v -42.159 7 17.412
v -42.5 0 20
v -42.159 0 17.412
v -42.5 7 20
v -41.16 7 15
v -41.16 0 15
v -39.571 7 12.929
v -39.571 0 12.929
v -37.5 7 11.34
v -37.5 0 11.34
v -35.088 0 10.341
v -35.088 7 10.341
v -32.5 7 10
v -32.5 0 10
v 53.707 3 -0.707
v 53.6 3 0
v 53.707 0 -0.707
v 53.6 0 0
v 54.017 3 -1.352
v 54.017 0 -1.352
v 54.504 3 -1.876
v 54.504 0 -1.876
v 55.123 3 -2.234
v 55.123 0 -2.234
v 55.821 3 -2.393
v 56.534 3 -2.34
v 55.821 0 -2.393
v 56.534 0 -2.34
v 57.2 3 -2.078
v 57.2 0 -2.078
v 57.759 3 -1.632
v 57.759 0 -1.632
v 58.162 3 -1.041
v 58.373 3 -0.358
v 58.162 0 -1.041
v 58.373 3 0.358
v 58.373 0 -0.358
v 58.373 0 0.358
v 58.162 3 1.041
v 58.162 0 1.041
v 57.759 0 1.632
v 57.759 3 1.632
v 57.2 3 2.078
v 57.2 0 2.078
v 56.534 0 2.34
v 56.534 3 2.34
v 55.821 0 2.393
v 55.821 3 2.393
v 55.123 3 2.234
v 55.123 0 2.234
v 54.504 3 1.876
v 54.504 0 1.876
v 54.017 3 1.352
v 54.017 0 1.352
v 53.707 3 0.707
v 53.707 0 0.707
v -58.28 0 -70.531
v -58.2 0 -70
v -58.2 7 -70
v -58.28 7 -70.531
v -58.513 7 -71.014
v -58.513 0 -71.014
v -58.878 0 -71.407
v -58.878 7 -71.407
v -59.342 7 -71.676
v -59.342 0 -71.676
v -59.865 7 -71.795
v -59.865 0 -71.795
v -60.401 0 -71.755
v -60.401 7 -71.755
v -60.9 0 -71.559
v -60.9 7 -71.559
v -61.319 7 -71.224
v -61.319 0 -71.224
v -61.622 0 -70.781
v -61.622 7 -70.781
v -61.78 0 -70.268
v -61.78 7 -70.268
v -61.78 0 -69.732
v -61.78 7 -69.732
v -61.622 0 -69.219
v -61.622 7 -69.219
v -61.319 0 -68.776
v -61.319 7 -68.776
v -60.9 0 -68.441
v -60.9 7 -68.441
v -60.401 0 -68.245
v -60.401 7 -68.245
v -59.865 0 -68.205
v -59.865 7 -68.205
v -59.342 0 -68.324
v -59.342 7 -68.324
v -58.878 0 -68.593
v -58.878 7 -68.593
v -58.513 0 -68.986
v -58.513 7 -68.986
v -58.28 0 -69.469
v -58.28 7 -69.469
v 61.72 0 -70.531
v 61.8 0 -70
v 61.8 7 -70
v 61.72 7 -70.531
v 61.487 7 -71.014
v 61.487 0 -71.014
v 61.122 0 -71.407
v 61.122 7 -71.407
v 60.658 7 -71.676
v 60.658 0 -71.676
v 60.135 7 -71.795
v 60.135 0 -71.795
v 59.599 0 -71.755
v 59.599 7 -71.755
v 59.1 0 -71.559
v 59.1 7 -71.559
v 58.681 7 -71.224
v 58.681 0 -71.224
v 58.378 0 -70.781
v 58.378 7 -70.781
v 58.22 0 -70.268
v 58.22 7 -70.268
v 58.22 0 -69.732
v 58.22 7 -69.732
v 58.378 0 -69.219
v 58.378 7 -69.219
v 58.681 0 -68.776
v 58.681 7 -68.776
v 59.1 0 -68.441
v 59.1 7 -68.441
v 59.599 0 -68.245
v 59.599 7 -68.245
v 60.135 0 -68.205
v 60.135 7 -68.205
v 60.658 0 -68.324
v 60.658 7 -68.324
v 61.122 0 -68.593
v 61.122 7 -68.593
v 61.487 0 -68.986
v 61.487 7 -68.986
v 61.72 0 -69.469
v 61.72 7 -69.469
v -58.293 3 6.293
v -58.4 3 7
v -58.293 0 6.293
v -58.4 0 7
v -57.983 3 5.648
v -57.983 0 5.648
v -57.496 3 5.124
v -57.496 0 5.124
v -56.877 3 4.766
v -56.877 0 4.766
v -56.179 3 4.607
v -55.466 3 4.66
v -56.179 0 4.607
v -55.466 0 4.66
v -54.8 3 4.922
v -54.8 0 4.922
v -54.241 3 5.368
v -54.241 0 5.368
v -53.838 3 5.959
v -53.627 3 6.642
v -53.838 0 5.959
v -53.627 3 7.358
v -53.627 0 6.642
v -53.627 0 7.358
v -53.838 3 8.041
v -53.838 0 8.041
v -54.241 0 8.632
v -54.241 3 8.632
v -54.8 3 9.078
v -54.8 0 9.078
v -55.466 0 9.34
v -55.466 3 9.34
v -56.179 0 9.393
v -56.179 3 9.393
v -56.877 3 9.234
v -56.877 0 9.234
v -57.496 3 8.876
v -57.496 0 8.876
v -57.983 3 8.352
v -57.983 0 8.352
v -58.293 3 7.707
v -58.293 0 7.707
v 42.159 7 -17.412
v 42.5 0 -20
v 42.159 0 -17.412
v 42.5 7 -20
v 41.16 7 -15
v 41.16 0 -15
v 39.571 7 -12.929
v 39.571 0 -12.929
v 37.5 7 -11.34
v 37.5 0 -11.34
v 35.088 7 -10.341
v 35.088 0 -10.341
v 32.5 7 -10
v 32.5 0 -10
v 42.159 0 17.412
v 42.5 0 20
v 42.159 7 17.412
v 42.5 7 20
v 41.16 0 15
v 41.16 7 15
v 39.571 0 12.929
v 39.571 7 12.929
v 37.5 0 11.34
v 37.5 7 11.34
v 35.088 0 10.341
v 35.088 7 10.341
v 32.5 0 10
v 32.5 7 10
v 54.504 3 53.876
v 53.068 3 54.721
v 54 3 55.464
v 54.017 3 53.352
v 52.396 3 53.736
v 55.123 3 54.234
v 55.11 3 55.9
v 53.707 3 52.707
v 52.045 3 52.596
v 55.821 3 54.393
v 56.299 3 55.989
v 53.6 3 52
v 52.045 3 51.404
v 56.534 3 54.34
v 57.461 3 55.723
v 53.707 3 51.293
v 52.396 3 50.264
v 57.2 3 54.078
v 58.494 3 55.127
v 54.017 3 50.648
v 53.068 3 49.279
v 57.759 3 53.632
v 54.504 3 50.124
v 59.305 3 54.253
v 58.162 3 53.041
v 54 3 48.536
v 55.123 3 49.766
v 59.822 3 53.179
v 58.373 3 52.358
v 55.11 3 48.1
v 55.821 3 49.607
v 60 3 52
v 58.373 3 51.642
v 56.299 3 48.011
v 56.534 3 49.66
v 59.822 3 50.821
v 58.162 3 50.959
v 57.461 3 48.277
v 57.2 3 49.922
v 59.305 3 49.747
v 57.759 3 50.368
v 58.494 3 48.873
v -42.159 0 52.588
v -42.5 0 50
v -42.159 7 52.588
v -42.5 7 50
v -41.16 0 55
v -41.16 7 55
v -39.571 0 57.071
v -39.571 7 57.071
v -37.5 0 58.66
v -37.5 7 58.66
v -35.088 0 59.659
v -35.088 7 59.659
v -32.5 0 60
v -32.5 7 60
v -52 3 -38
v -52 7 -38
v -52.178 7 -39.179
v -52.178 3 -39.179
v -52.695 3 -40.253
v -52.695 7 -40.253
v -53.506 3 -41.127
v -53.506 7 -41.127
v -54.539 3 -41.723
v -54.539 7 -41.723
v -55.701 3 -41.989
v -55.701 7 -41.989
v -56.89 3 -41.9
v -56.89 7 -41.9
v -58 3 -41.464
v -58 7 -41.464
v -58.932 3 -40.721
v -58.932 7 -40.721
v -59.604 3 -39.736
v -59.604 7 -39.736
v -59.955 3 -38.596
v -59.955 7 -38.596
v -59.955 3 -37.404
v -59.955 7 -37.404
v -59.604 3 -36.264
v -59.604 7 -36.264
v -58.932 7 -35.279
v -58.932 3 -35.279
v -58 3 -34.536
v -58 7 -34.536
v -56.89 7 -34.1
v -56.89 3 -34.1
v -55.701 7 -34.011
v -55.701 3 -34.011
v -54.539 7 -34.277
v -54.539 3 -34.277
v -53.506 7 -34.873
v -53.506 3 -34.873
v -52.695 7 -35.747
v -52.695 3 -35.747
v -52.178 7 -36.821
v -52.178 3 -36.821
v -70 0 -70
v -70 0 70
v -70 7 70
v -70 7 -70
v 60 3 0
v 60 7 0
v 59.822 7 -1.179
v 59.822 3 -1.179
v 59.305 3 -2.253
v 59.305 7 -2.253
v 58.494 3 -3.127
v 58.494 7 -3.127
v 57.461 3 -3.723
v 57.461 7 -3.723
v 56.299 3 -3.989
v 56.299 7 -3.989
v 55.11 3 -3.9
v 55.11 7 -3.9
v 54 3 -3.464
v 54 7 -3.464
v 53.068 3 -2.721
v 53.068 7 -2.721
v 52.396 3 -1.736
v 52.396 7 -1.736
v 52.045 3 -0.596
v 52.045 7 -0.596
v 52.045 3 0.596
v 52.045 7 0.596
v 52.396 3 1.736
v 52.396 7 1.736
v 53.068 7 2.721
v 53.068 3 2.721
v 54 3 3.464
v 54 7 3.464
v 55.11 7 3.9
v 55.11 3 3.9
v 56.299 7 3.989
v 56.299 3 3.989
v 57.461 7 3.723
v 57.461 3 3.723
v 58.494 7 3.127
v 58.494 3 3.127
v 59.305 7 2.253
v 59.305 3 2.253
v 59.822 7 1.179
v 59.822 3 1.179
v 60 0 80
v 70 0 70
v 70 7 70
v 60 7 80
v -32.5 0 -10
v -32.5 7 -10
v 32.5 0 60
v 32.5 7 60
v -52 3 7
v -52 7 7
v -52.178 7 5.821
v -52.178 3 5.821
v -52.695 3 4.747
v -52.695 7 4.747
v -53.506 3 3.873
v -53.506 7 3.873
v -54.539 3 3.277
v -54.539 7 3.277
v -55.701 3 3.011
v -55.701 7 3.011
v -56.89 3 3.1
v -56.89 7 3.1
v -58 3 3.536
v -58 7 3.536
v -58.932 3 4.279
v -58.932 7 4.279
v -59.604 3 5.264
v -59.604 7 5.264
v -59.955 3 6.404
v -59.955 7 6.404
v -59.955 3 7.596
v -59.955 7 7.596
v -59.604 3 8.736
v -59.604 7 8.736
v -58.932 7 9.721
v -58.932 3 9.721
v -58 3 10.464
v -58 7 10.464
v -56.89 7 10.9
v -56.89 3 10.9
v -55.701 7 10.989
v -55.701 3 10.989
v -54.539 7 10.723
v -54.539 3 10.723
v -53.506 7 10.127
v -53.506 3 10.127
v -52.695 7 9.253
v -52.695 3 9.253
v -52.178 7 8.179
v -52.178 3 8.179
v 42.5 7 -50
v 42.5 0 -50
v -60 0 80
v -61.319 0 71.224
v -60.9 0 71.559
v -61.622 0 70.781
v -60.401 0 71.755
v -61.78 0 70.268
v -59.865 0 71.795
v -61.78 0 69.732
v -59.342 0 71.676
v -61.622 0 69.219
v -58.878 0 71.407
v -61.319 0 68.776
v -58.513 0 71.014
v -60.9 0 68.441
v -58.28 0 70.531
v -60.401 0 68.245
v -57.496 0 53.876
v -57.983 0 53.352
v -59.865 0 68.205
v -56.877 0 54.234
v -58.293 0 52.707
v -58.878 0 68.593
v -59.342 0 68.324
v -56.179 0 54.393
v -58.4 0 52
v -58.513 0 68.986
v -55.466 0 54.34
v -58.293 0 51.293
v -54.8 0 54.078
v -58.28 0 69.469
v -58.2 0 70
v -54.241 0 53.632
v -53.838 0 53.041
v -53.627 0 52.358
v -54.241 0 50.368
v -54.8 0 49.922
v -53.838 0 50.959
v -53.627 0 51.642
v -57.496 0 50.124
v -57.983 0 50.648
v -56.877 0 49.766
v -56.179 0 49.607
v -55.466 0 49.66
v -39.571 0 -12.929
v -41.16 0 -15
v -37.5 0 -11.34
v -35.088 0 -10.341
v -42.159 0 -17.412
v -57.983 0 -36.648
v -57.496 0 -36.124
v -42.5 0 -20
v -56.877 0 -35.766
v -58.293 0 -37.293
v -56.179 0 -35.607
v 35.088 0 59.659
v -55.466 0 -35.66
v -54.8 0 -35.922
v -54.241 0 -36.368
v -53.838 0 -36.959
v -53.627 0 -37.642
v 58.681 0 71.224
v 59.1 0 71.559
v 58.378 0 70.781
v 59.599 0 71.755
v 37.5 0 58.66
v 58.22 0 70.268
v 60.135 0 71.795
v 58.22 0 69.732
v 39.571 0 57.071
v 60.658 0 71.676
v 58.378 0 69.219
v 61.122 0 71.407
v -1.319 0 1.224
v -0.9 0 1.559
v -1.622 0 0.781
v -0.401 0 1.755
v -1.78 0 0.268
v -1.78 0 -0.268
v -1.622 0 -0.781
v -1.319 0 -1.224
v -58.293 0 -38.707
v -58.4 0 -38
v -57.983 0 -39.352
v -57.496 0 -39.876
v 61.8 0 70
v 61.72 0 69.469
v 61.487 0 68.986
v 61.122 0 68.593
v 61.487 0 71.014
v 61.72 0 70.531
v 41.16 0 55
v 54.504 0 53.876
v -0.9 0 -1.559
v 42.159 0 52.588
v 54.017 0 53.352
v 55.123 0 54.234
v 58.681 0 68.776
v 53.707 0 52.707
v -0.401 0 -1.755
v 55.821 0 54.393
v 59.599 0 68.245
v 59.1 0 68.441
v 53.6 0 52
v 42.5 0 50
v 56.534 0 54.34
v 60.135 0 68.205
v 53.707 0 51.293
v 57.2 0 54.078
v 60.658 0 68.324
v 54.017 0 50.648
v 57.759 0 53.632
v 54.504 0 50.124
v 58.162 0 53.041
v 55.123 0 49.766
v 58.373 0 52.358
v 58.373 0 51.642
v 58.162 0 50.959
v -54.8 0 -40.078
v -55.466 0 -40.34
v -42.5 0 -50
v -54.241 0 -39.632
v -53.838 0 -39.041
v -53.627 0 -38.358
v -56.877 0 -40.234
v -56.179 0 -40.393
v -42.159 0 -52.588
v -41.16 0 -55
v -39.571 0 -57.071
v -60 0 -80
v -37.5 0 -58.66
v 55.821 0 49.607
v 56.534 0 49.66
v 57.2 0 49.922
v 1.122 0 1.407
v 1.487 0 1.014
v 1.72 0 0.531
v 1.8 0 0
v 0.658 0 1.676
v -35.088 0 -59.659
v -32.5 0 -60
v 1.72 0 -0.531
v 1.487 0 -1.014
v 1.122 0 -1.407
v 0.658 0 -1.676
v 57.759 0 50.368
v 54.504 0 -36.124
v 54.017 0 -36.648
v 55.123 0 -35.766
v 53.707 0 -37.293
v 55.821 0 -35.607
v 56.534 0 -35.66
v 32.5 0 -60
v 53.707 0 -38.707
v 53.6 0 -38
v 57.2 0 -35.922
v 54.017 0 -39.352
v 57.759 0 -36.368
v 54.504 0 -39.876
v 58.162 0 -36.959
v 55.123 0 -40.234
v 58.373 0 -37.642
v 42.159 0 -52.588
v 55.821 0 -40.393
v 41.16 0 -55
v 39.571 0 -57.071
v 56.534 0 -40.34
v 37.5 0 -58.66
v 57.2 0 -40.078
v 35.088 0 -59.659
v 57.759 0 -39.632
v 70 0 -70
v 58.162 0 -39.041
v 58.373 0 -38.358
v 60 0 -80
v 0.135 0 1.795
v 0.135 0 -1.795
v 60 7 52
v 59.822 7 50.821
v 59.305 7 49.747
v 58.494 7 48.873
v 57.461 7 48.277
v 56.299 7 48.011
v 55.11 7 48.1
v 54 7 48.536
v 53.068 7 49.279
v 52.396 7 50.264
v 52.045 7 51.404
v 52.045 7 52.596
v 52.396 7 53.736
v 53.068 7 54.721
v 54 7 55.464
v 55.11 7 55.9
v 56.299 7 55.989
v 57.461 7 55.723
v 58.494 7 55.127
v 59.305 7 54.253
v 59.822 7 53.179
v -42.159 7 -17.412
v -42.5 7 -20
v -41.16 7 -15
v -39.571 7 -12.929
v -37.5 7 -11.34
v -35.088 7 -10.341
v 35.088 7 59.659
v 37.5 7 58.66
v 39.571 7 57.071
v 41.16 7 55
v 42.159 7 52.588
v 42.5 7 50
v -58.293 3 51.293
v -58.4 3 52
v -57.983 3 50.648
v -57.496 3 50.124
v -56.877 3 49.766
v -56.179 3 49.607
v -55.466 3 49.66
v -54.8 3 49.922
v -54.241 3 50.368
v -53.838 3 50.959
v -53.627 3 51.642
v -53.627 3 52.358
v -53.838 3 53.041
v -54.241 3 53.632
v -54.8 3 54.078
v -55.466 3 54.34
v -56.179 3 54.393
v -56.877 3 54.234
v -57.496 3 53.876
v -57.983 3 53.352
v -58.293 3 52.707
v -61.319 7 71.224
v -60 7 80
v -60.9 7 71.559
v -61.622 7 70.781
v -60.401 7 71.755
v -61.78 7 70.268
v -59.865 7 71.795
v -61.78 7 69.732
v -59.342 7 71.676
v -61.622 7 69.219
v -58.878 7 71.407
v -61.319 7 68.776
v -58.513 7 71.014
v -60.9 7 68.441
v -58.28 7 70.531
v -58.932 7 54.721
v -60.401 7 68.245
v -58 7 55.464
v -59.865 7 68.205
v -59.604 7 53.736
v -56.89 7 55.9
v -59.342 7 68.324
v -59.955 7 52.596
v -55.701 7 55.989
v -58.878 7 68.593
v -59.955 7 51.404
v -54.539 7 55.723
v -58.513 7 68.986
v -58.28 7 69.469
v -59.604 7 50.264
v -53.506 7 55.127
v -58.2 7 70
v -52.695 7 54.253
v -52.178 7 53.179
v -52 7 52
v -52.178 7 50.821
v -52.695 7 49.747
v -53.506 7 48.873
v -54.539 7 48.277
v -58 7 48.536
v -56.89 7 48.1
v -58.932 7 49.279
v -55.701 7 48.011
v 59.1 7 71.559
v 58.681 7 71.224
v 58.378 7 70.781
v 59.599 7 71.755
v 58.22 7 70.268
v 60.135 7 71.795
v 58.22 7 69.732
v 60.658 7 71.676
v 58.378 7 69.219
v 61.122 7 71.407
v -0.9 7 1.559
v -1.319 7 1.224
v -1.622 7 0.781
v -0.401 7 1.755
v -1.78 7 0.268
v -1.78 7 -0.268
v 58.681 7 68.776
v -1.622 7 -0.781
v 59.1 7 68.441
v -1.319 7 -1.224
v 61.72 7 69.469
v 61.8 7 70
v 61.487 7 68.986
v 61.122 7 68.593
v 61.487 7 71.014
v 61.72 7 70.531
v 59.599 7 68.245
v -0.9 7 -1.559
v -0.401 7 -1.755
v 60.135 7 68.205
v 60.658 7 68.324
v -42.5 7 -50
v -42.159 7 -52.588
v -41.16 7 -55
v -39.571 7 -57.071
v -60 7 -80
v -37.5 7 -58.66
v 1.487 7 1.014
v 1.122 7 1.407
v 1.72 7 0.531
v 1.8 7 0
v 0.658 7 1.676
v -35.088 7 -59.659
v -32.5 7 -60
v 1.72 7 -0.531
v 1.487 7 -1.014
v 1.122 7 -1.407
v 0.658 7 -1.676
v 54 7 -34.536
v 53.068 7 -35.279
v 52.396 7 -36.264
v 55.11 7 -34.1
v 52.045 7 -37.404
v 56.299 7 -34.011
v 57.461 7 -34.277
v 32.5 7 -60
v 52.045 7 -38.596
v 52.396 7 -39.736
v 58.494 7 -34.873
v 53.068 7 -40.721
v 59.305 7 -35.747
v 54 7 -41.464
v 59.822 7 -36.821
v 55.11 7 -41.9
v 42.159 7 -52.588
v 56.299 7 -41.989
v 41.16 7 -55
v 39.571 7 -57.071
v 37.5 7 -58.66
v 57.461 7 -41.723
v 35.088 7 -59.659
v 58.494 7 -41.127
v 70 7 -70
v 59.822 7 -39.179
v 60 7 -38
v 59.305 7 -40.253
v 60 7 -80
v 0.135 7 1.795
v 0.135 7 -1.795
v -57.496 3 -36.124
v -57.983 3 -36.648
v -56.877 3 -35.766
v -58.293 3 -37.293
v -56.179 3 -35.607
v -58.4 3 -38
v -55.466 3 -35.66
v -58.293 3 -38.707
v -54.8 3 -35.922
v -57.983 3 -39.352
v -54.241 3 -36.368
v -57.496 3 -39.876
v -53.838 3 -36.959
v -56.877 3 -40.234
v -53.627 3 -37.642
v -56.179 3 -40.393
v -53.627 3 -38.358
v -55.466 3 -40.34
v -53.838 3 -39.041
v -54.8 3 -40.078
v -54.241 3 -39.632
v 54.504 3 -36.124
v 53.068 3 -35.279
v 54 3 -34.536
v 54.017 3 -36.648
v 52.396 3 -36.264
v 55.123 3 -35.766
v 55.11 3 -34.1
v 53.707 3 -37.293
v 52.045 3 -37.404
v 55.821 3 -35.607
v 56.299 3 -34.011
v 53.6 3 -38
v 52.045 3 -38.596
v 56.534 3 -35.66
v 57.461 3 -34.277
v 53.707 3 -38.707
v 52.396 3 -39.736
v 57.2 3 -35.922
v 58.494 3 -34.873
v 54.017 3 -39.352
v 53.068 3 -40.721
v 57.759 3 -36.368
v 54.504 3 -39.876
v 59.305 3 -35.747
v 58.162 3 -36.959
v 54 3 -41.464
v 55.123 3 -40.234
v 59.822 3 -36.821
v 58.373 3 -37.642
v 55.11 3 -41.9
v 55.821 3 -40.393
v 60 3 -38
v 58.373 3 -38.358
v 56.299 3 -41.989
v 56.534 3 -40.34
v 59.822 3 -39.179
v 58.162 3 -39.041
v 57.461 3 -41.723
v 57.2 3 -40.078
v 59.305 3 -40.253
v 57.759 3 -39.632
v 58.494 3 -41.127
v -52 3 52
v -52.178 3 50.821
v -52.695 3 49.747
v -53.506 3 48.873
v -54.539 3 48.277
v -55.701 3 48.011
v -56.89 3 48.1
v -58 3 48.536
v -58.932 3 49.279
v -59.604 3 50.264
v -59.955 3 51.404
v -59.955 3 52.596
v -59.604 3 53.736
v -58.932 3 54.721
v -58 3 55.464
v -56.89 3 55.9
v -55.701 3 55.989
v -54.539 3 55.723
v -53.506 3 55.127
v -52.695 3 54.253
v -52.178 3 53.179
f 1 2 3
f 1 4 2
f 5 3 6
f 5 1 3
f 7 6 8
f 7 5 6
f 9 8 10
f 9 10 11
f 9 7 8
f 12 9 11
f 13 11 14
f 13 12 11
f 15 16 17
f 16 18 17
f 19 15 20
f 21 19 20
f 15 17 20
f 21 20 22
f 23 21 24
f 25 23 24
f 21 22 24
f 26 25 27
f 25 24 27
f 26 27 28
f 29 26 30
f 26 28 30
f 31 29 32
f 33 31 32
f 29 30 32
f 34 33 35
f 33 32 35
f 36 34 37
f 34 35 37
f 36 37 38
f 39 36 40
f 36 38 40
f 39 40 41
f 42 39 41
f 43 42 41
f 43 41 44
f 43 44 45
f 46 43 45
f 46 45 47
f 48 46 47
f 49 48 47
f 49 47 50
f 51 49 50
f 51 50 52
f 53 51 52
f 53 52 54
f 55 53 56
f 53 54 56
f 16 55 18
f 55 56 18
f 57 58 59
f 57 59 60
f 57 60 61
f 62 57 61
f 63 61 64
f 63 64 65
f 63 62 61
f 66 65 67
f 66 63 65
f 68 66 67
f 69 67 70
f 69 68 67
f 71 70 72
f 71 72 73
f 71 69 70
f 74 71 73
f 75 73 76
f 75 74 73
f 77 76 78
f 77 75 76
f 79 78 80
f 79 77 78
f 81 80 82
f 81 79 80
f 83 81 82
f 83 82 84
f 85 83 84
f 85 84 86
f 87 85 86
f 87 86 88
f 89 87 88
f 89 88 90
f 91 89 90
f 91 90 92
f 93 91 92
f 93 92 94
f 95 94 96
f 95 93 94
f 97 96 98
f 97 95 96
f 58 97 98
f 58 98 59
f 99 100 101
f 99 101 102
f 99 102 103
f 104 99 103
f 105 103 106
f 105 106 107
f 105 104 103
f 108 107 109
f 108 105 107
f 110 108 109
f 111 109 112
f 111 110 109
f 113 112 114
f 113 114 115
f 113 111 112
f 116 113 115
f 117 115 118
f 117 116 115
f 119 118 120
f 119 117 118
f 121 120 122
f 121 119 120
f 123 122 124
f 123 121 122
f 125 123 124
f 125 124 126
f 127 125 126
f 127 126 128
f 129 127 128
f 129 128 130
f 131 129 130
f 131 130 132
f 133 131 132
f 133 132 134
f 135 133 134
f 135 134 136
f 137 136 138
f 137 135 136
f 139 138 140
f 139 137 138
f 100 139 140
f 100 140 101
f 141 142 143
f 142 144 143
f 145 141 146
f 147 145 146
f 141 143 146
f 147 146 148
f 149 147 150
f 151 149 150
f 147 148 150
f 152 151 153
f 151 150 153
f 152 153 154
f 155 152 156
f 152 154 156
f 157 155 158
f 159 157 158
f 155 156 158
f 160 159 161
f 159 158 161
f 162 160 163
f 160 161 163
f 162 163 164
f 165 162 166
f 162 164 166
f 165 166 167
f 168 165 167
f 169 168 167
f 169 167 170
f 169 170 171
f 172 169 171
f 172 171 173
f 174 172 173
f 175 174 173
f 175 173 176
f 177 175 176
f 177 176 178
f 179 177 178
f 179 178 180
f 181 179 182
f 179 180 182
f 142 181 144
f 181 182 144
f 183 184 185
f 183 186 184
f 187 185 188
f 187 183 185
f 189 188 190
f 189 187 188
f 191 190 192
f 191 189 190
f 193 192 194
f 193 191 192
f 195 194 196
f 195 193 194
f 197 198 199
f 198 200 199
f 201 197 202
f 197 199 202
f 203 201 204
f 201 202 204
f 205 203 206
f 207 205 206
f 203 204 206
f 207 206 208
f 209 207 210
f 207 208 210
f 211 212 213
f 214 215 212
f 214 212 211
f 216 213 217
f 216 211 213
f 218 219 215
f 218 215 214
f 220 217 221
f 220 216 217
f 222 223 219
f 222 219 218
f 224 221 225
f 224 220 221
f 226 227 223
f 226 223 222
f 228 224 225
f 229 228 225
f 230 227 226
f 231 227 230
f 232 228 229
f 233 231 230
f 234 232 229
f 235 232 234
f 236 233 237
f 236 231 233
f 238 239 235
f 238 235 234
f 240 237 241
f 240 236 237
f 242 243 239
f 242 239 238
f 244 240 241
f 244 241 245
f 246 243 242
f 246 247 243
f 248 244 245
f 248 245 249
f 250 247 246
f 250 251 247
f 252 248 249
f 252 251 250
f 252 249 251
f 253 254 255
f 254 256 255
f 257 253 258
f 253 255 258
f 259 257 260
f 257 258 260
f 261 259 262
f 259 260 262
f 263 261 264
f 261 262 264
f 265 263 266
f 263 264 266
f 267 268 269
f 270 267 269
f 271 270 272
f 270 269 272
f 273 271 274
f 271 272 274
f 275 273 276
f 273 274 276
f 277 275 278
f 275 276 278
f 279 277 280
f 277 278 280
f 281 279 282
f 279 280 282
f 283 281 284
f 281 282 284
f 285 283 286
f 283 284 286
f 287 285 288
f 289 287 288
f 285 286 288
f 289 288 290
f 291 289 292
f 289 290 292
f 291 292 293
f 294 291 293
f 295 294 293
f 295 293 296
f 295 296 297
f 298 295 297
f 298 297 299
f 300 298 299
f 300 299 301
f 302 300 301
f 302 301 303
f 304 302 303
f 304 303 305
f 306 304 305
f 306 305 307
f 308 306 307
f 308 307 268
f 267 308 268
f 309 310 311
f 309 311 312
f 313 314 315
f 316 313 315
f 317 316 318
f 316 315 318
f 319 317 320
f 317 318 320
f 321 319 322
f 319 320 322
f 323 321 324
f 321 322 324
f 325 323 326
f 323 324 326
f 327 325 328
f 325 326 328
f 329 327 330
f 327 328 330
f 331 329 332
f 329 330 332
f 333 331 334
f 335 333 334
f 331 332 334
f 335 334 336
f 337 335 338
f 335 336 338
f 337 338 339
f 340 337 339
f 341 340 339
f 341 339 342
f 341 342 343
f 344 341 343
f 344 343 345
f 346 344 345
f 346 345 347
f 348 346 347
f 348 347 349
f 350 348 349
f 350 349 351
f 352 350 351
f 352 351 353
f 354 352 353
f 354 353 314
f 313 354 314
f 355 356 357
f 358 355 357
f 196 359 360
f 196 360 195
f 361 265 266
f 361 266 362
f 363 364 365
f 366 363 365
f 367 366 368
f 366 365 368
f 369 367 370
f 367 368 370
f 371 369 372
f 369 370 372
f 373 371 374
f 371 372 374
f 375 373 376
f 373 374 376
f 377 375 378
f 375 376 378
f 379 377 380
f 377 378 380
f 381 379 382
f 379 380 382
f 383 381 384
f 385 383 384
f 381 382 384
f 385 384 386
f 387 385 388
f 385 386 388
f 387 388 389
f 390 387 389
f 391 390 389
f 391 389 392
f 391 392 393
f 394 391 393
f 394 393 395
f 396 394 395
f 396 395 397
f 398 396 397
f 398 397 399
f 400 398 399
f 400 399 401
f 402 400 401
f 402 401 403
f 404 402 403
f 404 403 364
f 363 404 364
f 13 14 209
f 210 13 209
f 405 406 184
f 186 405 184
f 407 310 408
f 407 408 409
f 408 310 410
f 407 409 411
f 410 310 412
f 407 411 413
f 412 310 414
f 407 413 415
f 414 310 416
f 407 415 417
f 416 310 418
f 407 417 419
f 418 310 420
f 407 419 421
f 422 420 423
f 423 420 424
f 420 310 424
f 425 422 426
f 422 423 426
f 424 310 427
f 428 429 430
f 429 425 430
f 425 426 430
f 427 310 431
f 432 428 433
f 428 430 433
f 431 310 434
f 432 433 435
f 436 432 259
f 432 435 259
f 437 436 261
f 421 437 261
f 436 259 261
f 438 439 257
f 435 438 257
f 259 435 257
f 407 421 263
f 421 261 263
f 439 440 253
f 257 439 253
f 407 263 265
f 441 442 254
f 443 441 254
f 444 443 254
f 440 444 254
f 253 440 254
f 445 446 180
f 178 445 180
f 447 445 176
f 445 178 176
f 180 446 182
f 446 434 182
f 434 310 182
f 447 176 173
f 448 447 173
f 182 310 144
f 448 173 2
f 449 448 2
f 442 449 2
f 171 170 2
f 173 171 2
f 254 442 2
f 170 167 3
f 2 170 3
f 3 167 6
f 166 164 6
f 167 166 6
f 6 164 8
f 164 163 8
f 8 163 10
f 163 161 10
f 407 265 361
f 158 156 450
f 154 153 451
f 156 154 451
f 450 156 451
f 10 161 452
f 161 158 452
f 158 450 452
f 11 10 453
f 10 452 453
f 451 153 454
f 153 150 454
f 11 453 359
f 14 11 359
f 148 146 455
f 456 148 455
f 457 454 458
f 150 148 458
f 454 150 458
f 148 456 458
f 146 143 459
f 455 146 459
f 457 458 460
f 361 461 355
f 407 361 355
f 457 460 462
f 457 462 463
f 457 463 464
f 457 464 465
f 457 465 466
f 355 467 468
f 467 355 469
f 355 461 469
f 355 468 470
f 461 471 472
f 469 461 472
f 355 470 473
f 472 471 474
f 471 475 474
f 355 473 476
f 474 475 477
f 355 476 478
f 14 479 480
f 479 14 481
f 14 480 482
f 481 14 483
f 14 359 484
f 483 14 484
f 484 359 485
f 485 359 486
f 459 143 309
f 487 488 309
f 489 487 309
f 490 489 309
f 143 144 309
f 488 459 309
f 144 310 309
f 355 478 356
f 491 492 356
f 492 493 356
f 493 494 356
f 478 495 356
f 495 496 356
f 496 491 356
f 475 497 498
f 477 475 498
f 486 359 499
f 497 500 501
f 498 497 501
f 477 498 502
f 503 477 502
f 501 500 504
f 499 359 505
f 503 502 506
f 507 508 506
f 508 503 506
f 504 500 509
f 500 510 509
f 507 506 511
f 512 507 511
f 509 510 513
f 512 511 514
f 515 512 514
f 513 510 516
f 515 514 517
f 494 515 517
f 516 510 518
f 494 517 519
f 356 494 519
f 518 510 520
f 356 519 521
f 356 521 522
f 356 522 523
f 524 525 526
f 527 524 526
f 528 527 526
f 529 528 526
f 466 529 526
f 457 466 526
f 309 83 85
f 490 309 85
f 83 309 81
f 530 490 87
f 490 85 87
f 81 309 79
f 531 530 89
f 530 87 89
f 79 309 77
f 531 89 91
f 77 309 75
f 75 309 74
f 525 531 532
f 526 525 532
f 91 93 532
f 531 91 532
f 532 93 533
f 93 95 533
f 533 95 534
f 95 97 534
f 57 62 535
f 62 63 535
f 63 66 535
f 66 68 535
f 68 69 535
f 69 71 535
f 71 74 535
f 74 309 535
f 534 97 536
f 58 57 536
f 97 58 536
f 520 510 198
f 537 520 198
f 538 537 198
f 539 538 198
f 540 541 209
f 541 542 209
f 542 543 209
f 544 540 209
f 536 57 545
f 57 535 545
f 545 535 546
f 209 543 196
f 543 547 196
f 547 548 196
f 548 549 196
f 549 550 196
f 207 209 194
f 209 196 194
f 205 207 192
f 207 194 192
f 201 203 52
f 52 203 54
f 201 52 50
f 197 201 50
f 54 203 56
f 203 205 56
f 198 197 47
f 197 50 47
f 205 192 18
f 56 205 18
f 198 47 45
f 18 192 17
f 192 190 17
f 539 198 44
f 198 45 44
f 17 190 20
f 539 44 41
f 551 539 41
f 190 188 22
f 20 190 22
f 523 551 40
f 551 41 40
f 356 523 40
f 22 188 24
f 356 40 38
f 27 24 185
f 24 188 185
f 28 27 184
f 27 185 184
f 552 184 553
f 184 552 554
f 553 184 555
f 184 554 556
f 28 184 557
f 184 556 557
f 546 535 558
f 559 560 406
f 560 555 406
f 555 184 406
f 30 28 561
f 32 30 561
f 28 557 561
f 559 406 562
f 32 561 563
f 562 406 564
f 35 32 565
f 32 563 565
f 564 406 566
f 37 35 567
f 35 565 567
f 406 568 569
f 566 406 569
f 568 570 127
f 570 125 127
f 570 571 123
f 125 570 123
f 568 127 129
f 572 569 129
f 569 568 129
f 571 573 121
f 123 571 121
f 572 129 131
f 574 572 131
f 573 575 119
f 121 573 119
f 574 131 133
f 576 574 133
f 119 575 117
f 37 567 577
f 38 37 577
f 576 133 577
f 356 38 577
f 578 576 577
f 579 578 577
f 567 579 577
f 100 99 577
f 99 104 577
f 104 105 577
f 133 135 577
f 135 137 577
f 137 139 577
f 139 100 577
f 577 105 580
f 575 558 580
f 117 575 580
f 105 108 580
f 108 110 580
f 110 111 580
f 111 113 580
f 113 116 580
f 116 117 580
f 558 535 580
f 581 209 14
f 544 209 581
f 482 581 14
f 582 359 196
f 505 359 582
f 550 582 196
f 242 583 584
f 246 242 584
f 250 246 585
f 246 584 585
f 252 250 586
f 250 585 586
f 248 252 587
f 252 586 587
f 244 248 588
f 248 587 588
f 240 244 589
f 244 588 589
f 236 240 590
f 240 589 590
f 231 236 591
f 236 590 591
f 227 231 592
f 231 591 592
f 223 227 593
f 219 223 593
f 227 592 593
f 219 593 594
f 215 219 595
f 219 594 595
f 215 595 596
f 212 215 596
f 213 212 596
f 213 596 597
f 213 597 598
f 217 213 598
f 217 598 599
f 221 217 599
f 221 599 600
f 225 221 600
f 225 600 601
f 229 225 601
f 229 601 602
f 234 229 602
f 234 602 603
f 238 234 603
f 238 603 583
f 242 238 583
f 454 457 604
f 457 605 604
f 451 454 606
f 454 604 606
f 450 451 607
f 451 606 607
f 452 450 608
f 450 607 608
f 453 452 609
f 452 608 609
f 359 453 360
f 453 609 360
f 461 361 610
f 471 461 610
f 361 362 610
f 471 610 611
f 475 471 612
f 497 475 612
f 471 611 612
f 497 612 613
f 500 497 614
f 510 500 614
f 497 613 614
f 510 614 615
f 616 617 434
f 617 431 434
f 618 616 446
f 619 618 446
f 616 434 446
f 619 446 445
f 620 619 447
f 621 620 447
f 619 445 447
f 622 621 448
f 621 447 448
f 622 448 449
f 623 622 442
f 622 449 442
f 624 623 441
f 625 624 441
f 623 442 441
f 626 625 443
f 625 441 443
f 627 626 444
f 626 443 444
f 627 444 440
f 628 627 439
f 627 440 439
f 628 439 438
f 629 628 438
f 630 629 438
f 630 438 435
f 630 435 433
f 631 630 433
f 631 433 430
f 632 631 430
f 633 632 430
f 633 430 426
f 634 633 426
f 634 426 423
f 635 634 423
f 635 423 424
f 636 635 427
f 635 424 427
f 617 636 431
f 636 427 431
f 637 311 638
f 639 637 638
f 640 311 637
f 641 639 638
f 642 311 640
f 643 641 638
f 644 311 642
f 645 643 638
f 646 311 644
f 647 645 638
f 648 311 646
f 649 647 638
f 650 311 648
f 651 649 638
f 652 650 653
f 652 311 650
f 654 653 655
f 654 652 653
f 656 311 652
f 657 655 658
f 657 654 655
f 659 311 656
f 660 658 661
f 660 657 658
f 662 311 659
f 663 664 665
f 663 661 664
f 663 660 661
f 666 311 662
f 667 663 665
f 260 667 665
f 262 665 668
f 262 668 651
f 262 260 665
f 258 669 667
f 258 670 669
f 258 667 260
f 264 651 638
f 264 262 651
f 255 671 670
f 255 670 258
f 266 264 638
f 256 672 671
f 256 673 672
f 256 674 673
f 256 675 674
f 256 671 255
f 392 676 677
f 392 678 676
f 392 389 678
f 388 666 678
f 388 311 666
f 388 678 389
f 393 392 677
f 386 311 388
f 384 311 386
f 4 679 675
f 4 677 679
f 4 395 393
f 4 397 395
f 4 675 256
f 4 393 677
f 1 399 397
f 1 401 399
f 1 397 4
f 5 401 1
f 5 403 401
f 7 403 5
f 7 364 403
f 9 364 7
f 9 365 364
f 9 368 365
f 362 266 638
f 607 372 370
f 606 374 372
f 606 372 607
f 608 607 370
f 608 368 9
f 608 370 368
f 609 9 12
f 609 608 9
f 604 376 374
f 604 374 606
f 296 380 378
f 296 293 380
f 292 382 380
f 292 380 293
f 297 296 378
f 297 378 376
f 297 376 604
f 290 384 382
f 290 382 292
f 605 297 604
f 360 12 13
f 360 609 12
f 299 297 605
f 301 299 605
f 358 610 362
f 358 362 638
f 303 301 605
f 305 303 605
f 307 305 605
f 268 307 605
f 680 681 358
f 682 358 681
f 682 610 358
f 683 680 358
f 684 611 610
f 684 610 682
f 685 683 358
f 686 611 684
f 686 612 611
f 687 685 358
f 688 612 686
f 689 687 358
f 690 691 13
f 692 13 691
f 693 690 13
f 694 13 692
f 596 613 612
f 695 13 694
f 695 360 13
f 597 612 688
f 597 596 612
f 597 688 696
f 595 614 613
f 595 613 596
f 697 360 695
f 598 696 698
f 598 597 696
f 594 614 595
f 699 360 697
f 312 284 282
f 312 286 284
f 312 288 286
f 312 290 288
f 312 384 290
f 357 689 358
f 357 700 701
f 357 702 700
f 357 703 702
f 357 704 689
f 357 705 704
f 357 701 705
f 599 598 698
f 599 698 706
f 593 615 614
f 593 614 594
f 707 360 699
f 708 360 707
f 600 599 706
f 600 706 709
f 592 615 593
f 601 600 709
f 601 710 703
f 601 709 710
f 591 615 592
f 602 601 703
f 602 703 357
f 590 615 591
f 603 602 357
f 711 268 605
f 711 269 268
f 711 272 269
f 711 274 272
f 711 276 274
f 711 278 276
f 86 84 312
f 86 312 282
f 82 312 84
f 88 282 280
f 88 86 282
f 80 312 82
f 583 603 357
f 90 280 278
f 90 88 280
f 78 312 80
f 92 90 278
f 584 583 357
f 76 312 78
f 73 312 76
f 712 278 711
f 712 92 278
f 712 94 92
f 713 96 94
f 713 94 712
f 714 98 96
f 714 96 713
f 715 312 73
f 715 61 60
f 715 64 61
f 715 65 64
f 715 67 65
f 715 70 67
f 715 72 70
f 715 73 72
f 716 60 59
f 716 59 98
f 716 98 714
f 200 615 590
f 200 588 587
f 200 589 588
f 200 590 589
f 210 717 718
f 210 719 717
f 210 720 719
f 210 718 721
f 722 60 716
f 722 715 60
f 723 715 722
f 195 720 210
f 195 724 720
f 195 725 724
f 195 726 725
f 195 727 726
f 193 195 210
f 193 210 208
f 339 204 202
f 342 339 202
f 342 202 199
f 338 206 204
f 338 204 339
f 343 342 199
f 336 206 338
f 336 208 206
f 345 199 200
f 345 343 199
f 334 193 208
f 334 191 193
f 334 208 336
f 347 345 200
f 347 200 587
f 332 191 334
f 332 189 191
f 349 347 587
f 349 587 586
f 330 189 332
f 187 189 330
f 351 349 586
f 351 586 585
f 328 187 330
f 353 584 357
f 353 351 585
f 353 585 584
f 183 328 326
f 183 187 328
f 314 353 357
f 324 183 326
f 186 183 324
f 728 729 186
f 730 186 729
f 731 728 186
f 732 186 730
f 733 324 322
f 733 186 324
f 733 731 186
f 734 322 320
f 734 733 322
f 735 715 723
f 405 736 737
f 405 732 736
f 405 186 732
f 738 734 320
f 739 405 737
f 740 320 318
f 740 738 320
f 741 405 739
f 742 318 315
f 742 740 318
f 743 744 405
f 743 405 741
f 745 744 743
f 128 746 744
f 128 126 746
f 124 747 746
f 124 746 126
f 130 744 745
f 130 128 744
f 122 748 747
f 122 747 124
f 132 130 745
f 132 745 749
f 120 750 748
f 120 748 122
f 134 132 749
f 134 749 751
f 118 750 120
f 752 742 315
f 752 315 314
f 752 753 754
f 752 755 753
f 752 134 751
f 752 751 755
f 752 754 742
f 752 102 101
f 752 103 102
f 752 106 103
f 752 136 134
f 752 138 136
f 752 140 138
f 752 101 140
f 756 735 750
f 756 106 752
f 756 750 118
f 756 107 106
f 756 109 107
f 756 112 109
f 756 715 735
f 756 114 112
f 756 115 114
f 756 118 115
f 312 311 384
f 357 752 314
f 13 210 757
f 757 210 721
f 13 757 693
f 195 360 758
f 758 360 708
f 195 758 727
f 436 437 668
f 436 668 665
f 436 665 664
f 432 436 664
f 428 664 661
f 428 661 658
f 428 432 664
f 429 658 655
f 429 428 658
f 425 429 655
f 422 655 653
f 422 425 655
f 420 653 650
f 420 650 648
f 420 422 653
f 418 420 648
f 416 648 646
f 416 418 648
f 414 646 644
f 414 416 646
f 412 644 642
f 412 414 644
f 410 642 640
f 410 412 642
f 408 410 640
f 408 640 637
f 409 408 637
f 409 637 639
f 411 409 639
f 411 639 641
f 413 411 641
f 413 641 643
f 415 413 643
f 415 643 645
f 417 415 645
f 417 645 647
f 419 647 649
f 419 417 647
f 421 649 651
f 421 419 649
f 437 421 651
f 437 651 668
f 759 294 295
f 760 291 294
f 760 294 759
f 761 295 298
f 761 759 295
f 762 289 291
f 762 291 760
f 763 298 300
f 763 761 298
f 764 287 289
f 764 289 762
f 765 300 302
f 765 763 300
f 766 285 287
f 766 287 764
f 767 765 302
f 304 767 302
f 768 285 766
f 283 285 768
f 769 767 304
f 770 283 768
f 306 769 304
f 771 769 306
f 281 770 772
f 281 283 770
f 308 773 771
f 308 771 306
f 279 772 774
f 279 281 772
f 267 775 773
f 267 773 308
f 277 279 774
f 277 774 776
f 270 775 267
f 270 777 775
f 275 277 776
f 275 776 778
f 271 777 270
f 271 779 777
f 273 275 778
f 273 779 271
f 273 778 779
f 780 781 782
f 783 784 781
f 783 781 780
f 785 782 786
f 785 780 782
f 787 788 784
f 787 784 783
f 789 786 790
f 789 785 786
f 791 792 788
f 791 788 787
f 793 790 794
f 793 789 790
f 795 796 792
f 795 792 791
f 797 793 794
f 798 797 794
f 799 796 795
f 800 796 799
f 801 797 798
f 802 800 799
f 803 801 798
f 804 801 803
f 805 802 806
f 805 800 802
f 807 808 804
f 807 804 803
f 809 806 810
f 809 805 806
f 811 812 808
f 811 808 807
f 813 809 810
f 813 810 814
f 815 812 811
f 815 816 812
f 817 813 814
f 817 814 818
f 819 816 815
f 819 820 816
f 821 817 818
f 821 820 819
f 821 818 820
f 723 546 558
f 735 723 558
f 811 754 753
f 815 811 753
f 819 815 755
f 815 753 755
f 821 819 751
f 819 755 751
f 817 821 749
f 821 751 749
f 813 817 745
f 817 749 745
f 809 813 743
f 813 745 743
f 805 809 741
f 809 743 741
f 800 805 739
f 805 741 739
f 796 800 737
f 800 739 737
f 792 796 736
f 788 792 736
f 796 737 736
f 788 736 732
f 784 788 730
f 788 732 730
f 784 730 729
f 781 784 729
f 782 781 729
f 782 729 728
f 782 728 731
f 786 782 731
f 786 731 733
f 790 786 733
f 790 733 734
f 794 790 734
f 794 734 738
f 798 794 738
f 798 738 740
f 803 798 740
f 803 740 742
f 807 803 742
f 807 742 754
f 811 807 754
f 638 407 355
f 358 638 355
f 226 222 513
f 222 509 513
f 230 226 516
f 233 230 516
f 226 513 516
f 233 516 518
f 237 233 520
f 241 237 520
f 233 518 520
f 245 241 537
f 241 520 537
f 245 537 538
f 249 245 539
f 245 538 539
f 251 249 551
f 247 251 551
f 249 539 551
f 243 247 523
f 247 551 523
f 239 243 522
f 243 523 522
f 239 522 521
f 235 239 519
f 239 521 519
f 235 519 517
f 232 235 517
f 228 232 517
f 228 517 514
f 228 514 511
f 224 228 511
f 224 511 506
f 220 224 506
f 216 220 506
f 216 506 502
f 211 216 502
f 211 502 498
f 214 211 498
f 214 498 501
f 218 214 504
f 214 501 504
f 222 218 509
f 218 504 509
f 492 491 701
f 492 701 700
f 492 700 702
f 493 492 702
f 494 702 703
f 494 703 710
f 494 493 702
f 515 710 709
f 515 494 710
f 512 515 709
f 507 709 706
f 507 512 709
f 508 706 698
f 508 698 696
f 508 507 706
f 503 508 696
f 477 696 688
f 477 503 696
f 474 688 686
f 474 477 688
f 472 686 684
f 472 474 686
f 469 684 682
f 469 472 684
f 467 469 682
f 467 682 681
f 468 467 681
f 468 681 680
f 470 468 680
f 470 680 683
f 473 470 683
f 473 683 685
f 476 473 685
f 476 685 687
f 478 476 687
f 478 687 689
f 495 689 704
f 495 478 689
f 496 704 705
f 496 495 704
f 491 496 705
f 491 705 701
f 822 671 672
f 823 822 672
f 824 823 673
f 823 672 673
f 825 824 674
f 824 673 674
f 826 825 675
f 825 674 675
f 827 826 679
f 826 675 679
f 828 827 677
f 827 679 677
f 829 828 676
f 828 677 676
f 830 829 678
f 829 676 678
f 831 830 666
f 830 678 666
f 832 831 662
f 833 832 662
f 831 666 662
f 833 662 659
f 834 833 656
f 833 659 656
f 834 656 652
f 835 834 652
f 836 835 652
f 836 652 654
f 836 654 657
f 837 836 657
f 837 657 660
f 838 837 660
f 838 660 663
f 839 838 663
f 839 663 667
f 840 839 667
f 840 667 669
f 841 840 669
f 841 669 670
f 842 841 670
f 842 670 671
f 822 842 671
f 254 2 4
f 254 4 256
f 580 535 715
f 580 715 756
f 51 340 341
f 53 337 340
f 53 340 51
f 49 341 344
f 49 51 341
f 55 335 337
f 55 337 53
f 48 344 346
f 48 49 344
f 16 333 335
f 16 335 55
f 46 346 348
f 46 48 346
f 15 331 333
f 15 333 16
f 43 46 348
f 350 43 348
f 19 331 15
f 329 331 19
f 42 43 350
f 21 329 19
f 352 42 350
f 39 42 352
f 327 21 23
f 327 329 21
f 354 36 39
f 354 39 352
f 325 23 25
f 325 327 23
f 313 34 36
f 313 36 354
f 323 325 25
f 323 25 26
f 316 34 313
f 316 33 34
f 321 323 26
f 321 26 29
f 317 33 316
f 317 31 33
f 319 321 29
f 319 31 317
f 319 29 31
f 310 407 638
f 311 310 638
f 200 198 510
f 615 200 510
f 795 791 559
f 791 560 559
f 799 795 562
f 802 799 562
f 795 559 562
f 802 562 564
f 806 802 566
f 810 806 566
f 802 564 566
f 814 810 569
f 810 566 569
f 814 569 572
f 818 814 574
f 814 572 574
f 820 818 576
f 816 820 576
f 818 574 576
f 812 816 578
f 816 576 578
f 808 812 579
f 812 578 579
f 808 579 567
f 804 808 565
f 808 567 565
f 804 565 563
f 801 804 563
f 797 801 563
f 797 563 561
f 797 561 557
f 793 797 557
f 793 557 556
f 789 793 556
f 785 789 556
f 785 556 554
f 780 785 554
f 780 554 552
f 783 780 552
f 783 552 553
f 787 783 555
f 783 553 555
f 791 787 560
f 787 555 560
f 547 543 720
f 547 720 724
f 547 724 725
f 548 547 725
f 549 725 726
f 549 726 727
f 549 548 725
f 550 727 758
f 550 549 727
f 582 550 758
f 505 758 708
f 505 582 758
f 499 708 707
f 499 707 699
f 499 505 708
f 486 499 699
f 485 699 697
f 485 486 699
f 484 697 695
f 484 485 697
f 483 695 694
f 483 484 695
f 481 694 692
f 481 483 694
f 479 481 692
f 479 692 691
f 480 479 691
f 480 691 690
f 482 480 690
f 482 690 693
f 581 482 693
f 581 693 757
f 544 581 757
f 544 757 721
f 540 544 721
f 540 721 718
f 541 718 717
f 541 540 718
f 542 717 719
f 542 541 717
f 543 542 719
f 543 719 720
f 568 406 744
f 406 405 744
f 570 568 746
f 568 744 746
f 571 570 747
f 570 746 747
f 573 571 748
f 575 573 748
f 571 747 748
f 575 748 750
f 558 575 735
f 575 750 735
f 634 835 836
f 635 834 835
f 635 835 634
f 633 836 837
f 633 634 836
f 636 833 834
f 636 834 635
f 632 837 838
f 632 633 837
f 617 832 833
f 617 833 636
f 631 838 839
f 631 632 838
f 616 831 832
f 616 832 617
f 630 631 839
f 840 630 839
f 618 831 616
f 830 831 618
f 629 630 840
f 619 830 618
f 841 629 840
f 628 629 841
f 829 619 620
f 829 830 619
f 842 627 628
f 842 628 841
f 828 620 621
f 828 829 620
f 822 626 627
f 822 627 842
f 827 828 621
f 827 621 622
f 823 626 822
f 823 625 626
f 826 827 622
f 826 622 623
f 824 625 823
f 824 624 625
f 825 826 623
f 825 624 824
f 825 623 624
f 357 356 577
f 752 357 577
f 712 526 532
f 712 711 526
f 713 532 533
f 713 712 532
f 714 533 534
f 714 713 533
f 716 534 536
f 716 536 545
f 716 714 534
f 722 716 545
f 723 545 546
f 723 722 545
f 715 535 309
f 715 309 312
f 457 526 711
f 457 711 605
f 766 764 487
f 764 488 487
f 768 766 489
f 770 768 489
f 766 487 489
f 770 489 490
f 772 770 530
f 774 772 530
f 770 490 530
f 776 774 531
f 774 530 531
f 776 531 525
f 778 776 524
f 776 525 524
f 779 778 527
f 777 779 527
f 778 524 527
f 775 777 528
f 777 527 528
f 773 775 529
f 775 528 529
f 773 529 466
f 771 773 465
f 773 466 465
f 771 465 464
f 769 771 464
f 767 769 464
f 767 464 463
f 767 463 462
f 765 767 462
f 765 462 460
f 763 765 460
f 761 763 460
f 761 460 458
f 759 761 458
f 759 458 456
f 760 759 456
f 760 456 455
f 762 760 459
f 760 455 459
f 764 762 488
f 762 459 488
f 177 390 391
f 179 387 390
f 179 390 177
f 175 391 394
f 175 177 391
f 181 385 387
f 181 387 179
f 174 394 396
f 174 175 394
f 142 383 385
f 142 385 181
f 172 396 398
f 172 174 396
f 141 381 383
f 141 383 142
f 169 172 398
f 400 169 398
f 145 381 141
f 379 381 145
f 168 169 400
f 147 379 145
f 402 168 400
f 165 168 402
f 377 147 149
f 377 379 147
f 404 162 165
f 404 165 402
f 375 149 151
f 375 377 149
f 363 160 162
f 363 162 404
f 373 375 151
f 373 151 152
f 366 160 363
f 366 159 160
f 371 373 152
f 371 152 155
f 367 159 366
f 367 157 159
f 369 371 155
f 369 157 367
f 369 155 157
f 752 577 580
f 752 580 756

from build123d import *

# Parameters (mm, degrees)
SKETCH1_W                      = 140
SKETCH1_H                      = 160
BOSS_EXTRUDE1_DEPTH            = 7
CBORE_FOR_M4_SHCS1_D           = 4.8
CBORE_FOR_M4_SHCS1_CBORE_D     = 8
CBORE_FOR_M4_SHCS1_CBORE_DEPTH = 4
CHAMFER1_SIZE                  = 10
CUT_EXTRUDE1_REACH             = 108.532
SKETCH8_W                      = 85
SKETCH8_H                      = 120
FILLET1_R                      = 10
SKETCH9_W                      = 85
SKETCH9_H                      = 20
BOSS_EXTRUDE3_DEPTH            = 7
FILLET2_R                      = 10
M3_CLEARANCE_HOLE1_OUTLINE_R   = 1.8
M3_CLEARANCE_HOLE1_DEPTH       = 7


# Read off the part's stored shape, not the designer's step: M3 Clearance Hole1
with BuildPart() as part:
    # Sketch1 → Boss-Extrude1 (new body)
    with BuildSketch(Plane(origin=(0, 0, 0), x_dir=(1, 0, 0), z_dir=(0, 1, 0))):
        Rectangle(SKETCH1_W, SKETCH1_H)
    extrude(amount=BOSS_EXTRUDE1_DEPTH)

    # CBORE for M4 SHCS1 (through all)
    with Locations(Plane(origin=(0, 7, 0), x_dir=(1, 0, 0), z_dir=(0, 1, 0))):
        with Locations((-56, 38), (56, 38), (-56, -7), (56, 0), (-56, -52), (56, -52)):
            CounterBoreHole(CBORE_FOR_M4_SHCS1_D / 2, CBORE_FOR_M4_SHCS1_CBORE_D / 2, CBORE_FOR_M4_SHCS1_CBORE_DEPTH)

    # Chamfer1
    chamfer1_edges = [part.edges().sort_by_distance(p)[0] for p in [
        (70, 3.5, 80),
        (-70, 3.5, 80),
        (-70, 3.5, -80),
        (70, 3.5, -80),
    ]]
    chamfer(chamfer1_edges, length=CHAMFER1_SIZE)

    # Sketch8 → Cut-Extrude1 (cut, up to next)
    with BuildSketch(Plane.XZ, mode=Mode.PRIVATE) as cut_extrude1_sk1:
        Rectangle(SKETCH8_W, SKETCH8_H)
    cut_extrude1_tool1 = extrude(cut_extrude1_sk1.sketch, amount=-CUT_EXTRUDE1_REACH, mode=Mode.PRIVATE) & part.part
    add(cut_extrude1_tool1.solids().sort_by_distance((0, 0, 0))[0], mode=Mode.SUBTRACT)

    # Fillet1
    fillet1_edges = [part.edges().sort_by_distance(p)[0] for p in [
        (-42.5, 3.5, -60),
        (-42.5, 3.5, 60),
        (42.5, 3.5, 60),
        (42.5, 3.5, -60),
    ]]
    fillet(fillet1_edges, radius=FILLET1_R)

    # Sketch9 → Boss-Extrude3 (add)
    with BuildSketch(Plane.XZ):
        Rectangle(SKETCH9_W, SKETCH9_H)
    extrude(amount=-BOSS_EXTRUDE3_DEPTH)

    # Fillet2
    fillet2_edges = [part.edges().sort_by_distance(p)[0] for p in [
        (42.5, 3.5, 10),
        (42.5, 3.5, -10),
        (-42.5, 3.5, -10),
        (-42.5, 3.5, 10),
    ]]
    fillet(fillet2_edges, radius=FILLET2_R)

    # M3 Clearance Hole1 outline → M3 Clearance Hole1 (cut)
    with BuildSketch(Plane(origin=(0, 0, 0), x_dir=(1, 0, 0), z_dir=(0, 1, 0))):
        with Locations((60, -70)):
            Circle(M3_CLEARANCE_HOLE1_OUTLINE_R)
        with Locations((-60, 70)):
            Circle(M3_CLEARANCE_HOLE1_OUTLINE_R)
        with Locations((-60, -70)):
            Circle(M3_CLEARANCE_HOLE1_OUTLINE_R)
        with Locations((60, 70)):
            Circle(M3_CLEARANCE_HOLE1_OUTLINE_R)
        Circle(M3_CLEARANCE_HOLE1_OUTLINE_R)
    extrude(amount=M3_CLEARANCE_HOLE1_DEPTH, mode=Mode.SUBTRACT)


solid = part.part
